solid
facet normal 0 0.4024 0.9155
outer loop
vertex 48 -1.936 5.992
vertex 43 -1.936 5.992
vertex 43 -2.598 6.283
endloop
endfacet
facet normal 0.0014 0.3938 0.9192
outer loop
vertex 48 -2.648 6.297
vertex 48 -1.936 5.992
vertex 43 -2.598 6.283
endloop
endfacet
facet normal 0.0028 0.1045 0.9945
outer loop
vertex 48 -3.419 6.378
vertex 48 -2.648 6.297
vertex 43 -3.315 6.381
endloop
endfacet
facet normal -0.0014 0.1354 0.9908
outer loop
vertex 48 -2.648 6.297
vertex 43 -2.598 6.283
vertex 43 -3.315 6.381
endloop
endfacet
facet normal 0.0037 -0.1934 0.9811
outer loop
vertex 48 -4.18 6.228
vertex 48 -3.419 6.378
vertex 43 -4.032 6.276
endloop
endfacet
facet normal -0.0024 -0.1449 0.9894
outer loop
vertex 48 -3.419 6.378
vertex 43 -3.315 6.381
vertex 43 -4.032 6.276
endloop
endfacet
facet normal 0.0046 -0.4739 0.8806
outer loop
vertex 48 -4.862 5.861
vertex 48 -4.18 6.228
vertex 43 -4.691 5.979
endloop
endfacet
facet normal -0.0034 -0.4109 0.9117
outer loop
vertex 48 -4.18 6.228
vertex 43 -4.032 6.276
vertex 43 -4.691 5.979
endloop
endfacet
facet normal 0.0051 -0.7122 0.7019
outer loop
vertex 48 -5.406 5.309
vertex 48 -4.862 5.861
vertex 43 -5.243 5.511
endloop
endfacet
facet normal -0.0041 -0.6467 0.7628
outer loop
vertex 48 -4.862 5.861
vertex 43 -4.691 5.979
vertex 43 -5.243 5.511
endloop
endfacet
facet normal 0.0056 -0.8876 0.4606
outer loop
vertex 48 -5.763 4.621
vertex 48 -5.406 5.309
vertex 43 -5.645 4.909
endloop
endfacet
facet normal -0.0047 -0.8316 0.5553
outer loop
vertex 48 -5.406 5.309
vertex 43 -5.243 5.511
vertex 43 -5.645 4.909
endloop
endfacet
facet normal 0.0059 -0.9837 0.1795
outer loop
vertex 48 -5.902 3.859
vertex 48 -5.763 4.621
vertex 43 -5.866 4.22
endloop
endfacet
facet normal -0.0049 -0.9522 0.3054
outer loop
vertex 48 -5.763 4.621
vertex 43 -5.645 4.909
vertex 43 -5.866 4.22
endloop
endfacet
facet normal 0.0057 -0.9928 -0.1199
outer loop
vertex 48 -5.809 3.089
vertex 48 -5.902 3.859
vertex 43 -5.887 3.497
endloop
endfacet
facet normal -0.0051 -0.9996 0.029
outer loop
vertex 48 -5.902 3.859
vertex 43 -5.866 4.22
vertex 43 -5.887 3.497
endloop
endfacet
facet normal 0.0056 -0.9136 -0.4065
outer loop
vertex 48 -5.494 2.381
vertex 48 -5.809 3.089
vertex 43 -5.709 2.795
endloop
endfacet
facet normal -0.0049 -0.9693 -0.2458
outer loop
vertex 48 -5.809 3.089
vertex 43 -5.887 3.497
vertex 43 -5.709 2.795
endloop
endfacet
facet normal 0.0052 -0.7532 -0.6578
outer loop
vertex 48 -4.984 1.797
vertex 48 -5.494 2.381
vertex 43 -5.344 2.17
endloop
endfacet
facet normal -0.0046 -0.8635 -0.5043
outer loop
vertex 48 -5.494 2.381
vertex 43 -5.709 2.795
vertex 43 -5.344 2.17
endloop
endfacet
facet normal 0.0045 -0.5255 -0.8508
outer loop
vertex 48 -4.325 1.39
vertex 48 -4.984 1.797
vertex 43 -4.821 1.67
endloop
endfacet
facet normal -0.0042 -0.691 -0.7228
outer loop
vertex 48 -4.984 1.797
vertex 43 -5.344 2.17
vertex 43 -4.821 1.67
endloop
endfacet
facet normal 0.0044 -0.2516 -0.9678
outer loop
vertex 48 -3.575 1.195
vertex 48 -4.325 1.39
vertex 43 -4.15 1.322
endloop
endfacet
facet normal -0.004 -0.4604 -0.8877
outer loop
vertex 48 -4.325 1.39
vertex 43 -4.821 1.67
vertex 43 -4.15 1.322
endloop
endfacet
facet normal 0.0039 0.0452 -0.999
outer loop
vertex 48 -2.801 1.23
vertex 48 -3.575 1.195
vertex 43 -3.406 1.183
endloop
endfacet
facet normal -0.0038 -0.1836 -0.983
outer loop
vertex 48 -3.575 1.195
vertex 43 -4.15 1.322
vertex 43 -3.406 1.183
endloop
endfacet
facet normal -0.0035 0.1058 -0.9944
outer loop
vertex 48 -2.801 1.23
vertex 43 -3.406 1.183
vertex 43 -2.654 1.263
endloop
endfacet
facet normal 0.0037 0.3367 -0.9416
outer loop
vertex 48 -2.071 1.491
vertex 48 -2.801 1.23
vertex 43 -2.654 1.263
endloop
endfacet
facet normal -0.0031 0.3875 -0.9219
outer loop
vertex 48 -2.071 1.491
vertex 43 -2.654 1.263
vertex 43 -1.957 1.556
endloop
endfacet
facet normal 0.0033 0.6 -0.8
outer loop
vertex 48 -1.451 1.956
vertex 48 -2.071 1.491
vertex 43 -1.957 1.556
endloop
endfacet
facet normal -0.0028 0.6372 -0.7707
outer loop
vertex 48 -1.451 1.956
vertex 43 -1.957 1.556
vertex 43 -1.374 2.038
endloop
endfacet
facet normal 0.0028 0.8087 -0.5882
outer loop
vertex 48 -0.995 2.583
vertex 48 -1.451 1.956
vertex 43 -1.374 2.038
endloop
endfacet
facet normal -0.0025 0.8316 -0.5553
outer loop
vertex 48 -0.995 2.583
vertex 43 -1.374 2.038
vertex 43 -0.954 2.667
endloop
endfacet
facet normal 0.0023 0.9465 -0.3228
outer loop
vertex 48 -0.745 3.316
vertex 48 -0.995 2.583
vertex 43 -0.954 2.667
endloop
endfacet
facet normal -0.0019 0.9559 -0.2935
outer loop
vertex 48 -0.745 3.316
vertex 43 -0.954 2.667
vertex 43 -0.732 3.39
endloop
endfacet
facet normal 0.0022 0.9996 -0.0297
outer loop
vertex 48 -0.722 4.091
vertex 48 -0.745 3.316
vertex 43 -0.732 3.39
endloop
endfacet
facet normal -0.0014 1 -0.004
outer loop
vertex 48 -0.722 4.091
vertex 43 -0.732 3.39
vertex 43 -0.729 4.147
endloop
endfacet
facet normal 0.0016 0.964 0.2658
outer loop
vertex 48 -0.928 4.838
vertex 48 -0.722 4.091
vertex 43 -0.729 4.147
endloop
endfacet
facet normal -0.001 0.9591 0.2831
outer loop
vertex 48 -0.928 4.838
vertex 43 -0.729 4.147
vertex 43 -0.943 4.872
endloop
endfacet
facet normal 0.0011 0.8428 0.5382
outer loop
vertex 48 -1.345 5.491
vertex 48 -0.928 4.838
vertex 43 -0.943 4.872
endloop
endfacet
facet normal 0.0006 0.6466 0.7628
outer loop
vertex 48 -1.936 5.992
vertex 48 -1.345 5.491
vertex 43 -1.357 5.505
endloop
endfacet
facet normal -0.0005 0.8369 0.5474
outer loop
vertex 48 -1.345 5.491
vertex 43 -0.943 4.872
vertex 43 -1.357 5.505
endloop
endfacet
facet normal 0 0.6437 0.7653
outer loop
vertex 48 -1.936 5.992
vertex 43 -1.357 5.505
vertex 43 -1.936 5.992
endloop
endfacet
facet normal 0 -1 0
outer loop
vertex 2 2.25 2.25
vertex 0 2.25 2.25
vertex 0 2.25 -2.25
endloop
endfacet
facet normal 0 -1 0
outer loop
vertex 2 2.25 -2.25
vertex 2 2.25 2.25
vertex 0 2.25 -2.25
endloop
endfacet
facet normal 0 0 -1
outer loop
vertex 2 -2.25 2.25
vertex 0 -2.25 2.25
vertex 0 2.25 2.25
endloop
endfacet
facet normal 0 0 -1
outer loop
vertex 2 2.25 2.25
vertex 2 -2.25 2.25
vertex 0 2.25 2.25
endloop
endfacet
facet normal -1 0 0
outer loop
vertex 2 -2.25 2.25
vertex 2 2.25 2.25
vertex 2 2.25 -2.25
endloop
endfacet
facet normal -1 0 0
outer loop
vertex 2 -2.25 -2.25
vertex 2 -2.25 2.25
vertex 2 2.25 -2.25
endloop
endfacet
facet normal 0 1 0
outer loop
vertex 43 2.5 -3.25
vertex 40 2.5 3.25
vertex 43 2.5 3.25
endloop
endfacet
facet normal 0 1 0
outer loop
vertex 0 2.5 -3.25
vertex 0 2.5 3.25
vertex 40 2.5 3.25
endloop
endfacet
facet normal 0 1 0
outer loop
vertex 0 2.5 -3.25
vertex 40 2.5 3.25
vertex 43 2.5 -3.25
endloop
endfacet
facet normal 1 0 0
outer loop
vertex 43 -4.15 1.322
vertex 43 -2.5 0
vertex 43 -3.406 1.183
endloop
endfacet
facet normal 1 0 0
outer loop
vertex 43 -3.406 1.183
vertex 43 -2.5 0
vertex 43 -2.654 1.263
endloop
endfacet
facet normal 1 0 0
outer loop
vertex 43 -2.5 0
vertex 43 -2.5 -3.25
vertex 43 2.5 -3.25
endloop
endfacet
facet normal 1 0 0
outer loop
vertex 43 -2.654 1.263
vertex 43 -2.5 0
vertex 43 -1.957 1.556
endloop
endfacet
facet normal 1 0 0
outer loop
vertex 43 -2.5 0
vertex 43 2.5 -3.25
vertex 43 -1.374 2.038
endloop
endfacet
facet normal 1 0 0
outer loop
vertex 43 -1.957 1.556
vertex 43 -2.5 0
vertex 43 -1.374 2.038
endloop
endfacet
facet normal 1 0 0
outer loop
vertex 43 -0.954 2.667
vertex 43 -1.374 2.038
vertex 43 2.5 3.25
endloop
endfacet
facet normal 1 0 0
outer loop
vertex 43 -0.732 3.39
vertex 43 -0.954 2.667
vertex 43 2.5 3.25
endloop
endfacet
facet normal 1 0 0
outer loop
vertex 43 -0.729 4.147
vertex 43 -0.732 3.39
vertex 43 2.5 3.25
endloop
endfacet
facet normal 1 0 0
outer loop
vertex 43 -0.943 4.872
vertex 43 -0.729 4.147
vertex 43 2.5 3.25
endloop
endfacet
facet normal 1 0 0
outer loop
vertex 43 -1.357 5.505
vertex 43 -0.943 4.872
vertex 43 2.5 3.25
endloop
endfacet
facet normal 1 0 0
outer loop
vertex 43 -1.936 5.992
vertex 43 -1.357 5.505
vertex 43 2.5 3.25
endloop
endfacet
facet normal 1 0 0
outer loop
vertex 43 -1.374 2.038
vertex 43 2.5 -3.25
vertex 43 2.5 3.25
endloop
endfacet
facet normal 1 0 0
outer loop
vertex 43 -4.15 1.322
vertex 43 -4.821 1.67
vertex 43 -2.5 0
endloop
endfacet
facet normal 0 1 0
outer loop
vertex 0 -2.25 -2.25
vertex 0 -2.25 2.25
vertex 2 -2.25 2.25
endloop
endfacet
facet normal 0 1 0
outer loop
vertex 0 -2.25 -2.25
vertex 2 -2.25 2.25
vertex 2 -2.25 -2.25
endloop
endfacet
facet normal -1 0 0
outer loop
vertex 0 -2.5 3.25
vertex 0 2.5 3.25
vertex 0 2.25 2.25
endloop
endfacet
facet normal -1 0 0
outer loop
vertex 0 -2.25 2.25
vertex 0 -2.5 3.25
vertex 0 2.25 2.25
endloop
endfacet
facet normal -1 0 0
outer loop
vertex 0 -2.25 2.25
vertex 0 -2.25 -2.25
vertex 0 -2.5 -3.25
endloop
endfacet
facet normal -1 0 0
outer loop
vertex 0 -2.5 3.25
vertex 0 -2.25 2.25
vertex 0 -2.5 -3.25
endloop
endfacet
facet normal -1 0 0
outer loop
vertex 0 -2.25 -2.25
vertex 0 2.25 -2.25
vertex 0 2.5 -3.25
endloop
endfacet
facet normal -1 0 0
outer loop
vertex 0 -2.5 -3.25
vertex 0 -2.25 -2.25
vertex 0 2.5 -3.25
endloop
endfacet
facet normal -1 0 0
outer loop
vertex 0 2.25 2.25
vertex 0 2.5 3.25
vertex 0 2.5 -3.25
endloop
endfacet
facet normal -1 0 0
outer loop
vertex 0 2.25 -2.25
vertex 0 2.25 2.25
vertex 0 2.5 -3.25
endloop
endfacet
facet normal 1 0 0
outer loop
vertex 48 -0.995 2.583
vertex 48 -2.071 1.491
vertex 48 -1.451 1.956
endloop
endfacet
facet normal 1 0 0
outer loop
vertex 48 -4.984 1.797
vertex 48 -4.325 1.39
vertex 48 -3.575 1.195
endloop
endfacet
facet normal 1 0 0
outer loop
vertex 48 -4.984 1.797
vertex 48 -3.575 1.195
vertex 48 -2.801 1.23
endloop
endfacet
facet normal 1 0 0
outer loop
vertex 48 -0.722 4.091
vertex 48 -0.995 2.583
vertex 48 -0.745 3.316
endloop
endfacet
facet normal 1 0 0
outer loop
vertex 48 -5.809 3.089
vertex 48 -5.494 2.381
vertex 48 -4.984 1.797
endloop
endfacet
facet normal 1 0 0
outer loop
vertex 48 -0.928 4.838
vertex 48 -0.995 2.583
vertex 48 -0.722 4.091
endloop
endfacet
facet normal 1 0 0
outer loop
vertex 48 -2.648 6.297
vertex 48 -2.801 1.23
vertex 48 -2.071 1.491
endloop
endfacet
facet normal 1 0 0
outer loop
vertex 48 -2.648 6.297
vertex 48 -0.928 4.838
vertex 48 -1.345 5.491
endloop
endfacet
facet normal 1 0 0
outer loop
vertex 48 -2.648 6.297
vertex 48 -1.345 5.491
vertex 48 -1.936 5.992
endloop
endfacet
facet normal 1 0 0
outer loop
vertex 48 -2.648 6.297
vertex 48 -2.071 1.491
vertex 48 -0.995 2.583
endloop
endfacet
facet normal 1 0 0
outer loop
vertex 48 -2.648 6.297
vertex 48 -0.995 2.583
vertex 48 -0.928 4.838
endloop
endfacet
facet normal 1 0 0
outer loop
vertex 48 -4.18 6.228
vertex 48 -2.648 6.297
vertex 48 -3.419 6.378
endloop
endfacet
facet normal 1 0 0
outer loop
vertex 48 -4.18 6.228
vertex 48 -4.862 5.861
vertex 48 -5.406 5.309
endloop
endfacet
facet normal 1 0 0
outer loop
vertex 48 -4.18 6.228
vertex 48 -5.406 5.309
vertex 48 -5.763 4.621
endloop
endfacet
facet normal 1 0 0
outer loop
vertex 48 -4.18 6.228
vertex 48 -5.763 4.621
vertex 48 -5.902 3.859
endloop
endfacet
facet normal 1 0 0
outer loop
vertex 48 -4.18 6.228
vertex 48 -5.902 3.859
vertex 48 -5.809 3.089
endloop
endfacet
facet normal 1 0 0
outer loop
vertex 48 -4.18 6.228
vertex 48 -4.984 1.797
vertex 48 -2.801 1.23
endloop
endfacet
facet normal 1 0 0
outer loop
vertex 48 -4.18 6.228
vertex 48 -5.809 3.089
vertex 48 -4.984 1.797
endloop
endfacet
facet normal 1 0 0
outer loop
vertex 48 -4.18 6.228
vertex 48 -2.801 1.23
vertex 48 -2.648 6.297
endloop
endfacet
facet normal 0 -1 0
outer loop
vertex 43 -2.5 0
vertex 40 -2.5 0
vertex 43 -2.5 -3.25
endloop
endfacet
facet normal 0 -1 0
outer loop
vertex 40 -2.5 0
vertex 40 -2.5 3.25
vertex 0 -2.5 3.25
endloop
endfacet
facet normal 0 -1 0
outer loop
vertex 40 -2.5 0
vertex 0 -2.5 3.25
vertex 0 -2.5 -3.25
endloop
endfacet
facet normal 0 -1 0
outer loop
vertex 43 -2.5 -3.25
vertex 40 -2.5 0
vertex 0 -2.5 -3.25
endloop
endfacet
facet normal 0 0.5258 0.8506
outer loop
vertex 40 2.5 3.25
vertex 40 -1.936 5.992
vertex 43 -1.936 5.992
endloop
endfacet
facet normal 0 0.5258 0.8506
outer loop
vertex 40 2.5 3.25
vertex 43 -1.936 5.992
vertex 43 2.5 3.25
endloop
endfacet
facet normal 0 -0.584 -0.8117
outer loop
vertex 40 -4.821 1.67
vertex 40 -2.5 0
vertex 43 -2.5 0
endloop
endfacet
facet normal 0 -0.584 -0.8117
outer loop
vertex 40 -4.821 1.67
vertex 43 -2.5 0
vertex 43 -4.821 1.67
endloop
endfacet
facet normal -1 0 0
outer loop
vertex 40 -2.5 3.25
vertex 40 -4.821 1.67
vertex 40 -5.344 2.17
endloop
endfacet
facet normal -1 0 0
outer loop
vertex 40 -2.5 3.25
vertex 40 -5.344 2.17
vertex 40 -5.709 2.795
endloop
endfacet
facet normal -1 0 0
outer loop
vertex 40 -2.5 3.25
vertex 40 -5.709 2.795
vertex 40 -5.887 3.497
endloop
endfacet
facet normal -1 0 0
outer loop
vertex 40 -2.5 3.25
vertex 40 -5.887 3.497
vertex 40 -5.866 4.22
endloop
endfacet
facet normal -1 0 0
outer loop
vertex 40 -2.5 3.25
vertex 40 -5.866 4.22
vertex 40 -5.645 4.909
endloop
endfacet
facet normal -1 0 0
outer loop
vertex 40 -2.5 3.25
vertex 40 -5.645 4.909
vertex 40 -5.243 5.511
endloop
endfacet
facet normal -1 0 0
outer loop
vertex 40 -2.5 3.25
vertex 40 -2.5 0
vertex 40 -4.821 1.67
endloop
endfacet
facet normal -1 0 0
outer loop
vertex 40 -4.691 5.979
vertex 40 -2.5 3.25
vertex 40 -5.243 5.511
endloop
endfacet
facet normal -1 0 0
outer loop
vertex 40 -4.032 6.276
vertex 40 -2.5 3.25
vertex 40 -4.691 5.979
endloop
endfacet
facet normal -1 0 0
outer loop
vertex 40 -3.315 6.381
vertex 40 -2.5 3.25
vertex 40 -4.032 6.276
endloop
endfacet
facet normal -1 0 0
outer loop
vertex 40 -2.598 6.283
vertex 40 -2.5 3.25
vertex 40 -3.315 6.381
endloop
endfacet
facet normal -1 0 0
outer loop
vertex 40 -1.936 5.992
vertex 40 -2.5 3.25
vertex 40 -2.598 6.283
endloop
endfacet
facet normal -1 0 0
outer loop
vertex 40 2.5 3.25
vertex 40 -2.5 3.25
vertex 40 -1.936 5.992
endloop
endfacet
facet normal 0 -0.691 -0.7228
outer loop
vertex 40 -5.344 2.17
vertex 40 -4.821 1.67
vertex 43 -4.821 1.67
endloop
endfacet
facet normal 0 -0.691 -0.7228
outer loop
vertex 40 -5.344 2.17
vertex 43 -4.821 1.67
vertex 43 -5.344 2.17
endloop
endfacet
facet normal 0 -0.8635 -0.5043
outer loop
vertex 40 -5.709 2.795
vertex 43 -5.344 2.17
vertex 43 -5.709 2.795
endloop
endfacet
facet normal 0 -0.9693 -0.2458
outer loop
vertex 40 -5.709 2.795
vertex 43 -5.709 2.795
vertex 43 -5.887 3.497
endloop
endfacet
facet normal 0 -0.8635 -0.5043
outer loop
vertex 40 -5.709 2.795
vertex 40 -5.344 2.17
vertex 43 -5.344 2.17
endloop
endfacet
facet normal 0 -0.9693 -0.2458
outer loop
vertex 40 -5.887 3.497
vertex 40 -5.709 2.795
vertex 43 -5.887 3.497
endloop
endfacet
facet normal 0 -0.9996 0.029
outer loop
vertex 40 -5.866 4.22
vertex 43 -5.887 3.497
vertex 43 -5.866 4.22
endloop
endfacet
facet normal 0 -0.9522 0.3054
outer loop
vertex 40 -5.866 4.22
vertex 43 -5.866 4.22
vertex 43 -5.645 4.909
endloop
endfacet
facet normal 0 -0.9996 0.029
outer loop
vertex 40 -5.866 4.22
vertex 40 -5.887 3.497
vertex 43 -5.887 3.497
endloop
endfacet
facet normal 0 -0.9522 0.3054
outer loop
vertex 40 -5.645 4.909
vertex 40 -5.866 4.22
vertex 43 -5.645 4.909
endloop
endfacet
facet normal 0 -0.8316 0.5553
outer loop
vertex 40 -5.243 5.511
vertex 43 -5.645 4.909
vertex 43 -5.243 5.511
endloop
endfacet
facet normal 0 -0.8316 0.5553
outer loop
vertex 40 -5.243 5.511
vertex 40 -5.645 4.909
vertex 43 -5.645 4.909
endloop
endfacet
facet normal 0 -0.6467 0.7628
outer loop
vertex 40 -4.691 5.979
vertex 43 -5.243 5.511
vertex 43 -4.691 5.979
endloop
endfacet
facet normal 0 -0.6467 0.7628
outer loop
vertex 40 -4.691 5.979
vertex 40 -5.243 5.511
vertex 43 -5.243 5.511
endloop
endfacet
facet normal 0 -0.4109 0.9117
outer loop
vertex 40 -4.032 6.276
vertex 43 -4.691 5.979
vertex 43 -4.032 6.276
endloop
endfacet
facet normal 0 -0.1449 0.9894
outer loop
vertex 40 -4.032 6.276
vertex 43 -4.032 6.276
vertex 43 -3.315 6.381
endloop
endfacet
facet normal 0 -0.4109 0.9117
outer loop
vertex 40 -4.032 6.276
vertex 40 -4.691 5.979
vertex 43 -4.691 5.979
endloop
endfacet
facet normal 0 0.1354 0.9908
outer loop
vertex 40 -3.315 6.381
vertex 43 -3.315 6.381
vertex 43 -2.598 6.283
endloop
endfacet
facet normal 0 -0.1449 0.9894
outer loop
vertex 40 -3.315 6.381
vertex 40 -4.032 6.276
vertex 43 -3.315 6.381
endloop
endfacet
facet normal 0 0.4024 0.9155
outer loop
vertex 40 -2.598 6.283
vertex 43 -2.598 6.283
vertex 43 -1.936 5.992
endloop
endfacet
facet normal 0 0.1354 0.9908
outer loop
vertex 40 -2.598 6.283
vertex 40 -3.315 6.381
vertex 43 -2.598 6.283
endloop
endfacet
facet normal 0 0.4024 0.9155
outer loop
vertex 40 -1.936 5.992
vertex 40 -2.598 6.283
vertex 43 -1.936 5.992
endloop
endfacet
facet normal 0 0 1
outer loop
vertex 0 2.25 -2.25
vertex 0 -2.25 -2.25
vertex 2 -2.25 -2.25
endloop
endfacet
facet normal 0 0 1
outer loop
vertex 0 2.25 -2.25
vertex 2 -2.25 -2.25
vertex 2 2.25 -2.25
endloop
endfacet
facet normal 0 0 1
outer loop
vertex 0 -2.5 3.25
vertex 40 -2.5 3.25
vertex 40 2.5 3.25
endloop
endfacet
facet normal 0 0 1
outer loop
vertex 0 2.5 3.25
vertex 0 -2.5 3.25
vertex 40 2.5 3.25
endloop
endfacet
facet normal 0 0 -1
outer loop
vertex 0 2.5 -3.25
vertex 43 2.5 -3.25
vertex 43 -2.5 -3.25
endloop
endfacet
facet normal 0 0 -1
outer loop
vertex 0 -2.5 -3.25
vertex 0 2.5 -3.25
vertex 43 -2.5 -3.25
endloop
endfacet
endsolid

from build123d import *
from build123d.topology import SkipClean

# Parameters (mm, degrees)
SKETCH2_W           = 6.5
SKETCH2_H           = 5
SKETCH2_W_2         = 4.5
SKETCH2_H_2         = 4.5
BOSS_EXTRUDE1_DEPTH = 2
BOSS_EXTRUDE2_START = 2
SKETCH2_2_W         = 6.5
SKETCH2_2_H         = 5
SKETCH2_2_W_2       = 4.5
SKETCH2_2_H_2       = 4.5
BOSS_EXTRUDE2_DEPTH = 38
BOSS_EXTRUDE3_DEPTH = 3
SKETCH6_R           = 2.6
BOSS_EXTRUDE4_DEPTH = 5


with BuildPart() as part:
    # Sketch2 → Boss-Extrude1 (new body)
    with BuildSketch(Plane(origin=(0, 0, 0), x_dir=(0, 0, -1), z_dir=(1, 0, 0))):
        Rectangle(SKETCH2_W, SKETCH2_H)
        Rectangle(SKETCH2_W_2, SKETCH2_H_2, mode=Mode.SUBTRACT)
    extrude(amount=BOSS_EXTRUDE1_DEPTH)

    # Sketch2<2> → Boss-Extrude2 (add)
    with BuildSketch(Plane(origin=(0, 0, 0), x_dir=(0, 0, -1), z_dir=(1, 0, 0)).offset(BOSS_EXTRUDE2_START)):
        Rectangle(SKETCH2_2_W, SKETCH2_2_H)
        Rectangle(SKETCH2_2_W_2, SKETCH2_2_H_2, mode=Mode.SUBTRACT)
        Rectangle(SKETCH2_2_W_2, SKETCH2_2_H_2)
    extrude(amount=BOSS_EXTRUDE2_DEPTH)

    # Sketch5 → Boss-Extrude3 (add)
    with BuildSketch(Plane(origin=(40, 0, 0), x_dir=(0, 0, -1), z_dir=(1, 0, 0))):
        with BuildLine():
            Line((-5.992134655, -1.935858048), (-3.25, 2.5))
            Line((-3.25, 2.5), (3.25, 2.5))
            Line((3.25, 2.5), (3.25, -2.5))
            Line((3.25, -2.5), (0, -2.5))
            Line((0, -2.5), (-1.669999982, -4.821353165))
            ThreePointArc((-1.669999982, -4.821353165), (-5.224212214, -5.465373947), (-5.992134655, -1.935858048))
        make_face()
    extrude(amount=BOSS_EXTRUDE3_DEPTH)

    # Sketch6 → Boss-Extrude4 (add)
    with SkipClean():  # the faces are left unmerged after this step: merging them gives an invalid solid
        with BuildSketch(Plane(origin=(43, 0, 0), x_dir=(0, 0, -1), z_dir=(1, 0, 0))):
            with Locations(Location((-3.780581608, -3.302983909, 0), (0, 0, 148.276697379))):
                Circle(SKETCH6_R)
        extrude(amount=BOSS_EXTRUDE4_DEPTH)


solid = part.part
